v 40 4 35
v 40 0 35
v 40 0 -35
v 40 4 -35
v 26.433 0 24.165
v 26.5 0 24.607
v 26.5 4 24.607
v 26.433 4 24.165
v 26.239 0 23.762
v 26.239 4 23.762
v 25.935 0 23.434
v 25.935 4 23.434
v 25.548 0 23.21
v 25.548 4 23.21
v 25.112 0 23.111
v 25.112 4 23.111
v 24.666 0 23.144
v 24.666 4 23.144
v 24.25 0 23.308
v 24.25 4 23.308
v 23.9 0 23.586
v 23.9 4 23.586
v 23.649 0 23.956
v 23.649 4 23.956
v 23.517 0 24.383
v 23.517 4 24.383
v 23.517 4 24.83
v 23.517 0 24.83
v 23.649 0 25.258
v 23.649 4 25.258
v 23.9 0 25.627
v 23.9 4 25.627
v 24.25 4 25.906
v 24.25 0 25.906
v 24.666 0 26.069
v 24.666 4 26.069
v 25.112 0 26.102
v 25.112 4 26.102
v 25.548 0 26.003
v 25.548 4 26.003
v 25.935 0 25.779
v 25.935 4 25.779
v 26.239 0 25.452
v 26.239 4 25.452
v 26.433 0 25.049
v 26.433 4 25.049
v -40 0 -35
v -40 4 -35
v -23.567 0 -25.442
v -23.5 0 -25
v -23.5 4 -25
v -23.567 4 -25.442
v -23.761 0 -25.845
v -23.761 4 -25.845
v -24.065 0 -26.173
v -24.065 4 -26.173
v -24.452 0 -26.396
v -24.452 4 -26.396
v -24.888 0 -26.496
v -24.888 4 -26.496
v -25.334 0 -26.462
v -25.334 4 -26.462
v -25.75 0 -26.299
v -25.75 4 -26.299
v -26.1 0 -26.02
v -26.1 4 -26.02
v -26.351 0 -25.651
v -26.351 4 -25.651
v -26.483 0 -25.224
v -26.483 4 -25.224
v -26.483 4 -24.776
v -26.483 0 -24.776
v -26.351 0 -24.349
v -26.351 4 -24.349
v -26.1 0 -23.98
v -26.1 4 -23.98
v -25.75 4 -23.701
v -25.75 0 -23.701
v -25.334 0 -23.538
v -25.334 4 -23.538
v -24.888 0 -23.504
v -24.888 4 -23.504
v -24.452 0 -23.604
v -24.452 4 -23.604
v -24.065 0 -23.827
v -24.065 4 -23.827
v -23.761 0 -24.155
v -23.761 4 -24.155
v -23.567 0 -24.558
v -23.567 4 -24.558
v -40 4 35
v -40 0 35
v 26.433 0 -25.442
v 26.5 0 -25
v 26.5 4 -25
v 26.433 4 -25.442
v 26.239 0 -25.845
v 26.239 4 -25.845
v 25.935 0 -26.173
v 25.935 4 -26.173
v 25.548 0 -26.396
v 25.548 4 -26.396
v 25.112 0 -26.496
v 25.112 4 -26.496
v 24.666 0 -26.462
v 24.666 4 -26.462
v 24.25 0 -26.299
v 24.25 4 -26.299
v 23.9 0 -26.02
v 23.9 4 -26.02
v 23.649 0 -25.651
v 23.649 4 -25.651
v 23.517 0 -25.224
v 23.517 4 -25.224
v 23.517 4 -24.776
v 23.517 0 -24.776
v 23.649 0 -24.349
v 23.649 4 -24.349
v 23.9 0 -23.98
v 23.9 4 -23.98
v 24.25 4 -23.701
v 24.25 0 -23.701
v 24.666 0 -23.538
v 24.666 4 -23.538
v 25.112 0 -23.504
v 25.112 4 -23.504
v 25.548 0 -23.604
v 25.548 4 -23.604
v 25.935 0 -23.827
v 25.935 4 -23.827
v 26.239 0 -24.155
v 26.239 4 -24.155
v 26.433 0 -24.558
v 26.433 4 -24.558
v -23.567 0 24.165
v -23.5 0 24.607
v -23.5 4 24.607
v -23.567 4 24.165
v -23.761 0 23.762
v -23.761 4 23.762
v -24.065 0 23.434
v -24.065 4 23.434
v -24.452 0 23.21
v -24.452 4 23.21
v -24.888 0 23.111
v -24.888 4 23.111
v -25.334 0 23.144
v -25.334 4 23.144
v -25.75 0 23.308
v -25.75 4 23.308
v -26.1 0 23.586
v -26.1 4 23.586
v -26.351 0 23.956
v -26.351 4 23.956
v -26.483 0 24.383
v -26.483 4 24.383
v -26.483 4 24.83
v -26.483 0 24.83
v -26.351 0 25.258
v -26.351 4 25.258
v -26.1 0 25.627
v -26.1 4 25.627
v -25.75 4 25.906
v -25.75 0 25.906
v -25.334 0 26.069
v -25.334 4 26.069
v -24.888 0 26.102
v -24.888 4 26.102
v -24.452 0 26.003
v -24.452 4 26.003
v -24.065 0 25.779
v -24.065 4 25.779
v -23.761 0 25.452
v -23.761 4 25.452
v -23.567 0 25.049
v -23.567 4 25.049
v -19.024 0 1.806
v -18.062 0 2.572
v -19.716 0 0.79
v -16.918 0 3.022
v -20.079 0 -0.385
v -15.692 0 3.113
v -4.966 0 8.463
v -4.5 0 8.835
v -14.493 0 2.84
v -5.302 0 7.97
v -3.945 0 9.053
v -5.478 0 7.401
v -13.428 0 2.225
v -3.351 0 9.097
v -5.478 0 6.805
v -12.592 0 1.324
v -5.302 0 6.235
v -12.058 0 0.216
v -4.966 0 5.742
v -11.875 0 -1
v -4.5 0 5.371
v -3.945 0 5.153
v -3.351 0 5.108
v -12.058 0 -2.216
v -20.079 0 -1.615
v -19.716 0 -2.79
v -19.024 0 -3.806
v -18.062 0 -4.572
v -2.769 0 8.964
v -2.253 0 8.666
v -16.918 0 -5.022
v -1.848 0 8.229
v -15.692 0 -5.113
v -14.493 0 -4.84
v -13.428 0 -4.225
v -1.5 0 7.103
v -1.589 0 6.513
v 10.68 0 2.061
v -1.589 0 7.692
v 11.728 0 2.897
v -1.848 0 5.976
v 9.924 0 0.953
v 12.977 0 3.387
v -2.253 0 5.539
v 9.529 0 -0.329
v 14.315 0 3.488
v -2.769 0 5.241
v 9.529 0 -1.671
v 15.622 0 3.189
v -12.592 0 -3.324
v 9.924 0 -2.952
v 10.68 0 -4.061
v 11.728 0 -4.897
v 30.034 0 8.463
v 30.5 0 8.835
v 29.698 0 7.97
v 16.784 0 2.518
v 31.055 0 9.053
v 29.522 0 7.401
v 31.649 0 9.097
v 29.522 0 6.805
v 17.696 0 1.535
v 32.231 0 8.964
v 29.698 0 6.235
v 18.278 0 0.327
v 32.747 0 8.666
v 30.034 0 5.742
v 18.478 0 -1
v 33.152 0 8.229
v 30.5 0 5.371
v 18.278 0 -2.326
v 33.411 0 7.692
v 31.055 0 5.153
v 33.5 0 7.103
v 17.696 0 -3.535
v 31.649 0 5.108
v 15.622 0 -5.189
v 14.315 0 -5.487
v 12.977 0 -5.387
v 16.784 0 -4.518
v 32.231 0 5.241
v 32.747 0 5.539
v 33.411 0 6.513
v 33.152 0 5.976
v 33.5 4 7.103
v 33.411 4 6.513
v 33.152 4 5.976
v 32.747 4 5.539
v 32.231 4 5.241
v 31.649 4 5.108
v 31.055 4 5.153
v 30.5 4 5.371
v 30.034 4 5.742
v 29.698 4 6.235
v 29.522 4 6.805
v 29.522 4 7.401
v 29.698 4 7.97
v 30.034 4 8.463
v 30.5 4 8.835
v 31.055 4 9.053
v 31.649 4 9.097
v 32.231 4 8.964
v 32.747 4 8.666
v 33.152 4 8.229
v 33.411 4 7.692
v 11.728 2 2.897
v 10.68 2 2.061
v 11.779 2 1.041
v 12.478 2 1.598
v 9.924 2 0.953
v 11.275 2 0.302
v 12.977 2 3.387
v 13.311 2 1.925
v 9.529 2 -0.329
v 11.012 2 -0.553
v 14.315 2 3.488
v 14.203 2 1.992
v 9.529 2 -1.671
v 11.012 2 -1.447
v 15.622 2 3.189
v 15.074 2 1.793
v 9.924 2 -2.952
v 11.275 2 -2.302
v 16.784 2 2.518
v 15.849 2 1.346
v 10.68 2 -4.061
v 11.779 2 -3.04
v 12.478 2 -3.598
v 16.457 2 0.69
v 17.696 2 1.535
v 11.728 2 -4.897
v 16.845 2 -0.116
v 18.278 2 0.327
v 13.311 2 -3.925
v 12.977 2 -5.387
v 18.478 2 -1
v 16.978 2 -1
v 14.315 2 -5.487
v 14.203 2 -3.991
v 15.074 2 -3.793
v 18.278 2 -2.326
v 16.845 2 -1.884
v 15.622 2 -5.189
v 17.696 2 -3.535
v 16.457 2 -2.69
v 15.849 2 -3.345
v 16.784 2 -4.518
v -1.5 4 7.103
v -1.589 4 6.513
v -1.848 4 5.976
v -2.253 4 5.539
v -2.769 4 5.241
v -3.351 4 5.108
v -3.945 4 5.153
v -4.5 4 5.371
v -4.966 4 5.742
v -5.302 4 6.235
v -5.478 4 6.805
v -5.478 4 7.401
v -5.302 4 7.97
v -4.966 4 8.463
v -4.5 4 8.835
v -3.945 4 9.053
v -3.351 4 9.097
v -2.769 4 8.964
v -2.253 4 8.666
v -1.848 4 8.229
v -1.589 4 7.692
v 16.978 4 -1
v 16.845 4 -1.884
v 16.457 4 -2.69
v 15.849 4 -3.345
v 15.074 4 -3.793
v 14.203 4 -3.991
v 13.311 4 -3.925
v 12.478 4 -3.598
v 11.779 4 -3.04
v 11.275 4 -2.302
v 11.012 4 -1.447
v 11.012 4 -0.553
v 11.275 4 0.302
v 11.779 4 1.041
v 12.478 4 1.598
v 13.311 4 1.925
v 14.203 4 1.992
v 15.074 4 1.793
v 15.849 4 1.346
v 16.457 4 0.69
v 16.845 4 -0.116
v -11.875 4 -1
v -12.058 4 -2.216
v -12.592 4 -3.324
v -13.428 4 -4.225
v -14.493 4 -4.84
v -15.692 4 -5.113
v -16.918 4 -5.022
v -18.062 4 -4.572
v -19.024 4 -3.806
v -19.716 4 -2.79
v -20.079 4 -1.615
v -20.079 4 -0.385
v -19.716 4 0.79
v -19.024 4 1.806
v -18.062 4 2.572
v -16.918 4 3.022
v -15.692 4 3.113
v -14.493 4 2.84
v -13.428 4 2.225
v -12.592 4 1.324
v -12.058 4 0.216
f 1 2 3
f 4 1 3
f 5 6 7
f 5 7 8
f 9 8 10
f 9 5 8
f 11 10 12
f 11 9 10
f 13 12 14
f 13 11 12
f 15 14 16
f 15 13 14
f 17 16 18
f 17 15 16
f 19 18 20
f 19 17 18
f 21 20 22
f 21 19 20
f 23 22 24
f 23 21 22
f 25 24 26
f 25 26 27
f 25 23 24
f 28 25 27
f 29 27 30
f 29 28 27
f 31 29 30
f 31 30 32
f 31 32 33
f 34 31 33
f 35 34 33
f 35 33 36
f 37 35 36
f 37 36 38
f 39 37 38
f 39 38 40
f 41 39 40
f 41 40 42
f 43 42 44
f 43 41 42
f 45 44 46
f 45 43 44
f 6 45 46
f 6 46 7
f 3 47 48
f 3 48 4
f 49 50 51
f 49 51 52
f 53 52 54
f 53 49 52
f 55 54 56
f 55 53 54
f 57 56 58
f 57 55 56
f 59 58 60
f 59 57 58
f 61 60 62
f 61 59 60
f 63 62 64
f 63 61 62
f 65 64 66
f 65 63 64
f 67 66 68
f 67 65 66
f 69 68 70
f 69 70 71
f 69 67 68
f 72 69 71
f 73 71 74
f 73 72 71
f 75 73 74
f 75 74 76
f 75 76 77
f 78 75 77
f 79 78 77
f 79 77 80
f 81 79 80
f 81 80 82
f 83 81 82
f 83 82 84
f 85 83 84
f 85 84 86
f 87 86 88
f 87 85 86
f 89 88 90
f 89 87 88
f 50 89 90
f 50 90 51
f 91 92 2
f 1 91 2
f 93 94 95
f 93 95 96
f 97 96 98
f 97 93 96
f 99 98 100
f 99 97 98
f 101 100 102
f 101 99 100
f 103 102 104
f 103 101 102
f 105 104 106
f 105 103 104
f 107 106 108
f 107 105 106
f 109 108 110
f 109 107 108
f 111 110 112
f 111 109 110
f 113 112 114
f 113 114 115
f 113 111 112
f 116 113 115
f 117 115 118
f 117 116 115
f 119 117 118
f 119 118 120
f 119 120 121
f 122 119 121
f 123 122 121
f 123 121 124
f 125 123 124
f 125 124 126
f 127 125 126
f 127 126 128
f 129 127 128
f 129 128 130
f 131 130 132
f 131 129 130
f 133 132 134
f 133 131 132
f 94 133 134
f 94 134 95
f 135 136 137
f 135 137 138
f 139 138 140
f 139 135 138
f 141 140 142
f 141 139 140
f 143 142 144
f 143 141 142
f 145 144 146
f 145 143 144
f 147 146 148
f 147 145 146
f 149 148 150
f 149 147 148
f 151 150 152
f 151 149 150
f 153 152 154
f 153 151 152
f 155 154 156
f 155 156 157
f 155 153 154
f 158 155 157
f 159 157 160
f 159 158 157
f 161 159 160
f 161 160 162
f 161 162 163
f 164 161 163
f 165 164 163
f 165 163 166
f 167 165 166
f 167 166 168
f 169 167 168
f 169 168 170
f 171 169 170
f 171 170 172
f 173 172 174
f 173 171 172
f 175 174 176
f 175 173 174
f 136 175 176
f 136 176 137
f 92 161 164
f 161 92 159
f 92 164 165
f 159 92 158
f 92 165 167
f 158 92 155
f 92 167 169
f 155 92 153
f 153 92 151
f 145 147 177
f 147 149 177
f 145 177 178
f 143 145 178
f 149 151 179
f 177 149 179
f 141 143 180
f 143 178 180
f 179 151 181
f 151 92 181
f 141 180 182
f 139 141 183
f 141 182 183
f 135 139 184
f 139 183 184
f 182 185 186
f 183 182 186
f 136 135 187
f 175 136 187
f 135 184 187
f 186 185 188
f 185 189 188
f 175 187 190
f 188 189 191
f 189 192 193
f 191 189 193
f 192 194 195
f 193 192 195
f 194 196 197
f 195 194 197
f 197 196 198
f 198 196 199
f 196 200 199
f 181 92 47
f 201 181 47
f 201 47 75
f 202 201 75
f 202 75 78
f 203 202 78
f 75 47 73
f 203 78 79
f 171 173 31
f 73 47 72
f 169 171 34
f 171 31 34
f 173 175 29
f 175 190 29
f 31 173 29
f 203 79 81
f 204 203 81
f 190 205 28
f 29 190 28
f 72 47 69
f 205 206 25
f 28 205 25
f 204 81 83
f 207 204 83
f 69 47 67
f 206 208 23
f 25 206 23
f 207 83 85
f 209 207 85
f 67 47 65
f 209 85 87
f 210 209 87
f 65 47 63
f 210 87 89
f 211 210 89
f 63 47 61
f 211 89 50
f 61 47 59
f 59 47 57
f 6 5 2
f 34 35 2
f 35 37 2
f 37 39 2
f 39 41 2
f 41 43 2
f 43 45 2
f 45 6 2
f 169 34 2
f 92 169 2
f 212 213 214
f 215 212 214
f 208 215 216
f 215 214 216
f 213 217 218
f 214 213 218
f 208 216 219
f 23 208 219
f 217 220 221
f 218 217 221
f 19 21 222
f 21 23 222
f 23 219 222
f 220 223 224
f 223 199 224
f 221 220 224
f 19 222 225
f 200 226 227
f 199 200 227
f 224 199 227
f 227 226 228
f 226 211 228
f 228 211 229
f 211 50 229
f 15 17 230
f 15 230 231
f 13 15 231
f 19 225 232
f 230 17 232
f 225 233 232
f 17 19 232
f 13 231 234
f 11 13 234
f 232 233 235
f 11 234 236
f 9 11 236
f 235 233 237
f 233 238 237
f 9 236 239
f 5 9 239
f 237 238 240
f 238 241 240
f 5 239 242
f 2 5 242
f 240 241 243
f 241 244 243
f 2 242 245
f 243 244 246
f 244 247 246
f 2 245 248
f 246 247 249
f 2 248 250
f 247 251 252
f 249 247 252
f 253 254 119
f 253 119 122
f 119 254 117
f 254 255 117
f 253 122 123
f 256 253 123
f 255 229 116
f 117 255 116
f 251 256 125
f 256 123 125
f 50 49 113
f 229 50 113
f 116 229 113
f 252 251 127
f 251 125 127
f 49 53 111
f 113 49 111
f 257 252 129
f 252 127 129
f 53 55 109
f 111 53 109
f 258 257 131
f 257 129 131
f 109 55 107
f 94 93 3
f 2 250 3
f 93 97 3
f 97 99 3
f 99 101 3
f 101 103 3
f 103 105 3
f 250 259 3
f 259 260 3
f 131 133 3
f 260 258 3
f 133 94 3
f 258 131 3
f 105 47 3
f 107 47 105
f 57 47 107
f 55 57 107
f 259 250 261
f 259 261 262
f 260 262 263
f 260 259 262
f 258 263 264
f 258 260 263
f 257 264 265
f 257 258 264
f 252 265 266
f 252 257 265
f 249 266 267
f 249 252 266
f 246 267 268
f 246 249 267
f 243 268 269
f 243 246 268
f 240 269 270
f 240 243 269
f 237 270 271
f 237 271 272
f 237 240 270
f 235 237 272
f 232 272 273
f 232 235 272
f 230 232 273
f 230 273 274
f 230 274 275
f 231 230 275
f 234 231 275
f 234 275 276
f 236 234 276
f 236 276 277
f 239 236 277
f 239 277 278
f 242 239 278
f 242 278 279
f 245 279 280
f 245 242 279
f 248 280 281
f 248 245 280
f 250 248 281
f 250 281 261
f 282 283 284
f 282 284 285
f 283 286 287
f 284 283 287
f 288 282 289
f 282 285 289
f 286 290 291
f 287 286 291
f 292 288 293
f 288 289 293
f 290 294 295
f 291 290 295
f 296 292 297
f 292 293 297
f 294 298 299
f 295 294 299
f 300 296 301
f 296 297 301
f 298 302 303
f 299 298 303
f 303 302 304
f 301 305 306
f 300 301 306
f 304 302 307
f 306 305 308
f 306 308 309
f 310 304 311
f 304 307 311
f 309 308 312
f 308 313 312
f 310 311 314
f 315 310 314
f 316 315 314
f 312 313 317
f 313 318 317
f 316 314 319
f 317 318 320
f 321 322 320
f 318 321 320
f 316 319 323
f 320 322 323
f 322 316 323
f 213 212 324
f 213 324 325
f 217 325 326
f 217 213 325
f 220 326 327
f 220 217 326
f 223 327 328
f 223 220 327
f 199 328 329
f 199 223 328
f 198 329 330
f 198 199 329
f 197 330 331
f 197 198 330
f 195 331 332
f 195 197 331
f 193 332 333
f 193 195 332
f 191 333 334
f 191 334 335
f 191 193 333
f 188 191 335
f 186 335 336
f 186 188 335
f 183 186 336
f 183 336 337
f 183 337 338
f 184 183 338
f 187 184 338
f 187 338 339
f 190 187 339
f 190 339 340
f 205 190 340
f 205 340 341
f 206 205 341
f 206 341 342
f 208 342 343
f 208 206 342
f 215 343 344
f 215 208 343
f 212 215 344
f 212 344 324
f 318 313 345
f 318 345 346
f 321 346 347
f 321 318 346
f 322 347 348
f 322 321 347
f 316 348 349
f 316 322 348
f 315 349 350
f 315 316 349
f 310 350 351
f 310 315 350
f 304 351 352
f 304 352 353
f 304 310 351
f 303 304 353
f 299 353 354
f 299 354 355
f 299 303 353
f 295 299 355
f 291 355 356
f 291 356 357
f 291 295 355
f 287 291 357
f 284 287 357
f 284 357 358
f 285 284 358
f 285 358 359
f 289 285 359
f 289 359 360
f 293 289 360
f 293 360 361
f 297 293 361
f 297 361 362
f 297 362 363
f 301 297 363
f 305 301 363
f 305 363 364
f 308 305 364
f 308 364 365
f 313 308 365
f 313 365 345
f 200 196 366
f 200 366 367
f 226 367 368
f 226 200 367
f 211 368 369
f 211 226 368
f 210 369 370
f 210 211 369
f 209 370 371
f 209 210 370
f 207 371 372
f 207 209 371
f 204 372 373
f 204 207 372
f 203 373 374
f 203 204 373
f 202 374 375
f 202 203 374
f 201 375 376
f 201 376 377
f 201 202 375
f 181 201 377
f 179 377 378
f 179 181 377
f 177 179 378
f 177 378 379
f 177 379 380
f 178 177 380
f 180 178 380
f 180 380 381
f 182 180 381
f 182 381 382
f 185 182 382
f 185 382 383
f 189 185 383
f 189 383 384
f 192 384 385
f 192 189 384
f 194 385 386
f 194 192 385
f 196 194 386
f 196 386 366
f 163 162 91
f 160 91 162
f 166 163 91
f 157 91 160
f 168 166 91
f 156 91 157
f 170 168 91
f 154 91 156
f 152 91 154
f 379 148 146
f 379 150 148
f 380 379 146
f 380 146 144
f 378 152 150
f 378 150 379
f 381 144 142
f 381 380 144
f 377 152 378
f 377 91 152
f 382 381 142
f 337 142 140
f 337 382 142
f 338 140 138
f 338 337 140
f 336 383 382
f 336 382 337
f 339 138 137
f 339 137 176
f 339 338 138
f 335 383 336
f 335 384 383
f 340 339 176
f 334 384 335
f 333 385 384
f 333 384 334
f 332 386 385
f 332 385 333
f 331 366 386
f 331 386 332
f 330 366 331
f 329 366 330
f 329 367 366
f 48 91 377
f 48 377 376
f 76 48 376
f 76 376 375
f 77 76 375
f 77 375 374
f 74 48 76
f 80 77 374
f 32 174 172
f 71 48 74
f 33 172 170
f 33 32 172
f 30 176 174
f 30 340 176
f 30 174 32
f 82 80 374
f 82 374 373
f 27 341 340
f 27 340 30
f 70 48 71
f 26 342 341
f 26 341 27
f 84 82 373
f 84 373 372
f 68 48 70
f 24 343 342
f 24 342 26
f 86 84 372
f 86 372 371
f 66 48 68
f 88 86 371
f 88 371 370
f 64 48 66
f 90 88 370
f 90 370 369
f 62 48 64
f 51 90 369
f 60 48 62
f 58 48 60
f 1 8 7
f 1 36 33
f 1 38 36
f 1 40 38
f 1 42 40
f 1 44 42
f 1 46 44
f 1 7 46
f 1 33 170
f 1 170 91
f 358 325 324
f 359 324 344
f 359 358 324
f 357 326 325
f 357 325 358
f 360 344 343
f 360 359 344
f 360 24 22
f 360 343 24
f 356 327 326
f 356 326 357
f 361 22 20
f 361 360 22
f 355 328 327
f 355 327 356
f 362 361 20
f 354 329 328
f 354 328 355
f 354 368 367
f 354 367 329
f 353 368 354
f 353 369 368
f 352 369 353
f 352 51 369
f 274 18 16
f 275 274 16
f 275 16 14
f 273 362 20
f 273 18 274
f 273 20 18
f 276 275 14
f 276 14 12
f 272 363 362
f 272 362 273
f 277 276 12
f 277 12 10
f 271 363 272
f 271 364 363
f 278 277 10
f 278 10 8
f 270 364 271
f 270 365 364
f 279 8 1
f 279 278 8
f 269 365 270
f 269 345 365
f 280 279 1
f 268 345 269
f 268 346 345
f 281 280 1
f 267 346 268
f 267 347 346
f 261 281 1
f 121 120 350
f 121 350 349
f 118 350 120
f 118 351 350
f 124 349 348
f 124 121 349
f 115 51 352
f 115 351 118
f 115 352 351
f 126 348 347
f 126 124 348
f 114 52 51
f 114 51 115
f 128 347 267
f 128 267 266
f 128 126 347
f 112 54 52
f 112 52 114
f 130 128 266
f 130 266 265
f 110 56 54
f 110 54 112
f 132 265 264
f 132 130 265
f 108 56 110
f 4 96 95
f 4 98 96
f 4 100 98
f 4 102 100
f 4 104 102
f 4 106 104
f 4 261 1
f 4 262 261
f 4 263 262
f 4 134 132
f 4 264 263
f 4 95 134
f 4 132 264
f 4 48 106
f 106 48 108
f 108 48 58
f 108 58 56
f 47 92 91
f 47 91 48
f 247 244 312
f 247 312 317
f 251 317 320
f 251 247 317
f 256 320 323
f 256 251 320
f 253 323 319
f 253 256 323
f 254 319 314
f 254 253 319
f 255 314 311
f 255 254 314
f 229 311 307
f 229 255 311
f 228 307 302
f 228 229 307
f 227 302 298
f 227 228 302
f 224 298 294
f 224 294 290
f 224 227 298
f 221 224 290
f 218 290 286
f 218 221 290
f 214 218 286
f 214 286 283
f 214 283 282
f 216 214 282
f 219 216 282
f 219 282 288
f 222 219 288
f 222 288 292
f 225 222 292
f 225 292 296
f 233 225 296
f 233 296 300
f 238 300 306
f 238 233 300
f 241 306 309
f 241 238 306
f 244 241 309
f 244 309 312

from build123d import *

# Parameters (mm, degrees)
SKETCH1_W           = 80
SKETCH1_H           = 70
SKETCH1_R           = 1.5
SKETCH1_R_2         = 2
SKETCH1_R_3         = 4.125
SKETCH1_R_4         = 3
BOSS_EXTRUDE4_DEPTH = 4
SKETCH1_7_R         = 4.5
CUT_EXTRUDE2_DEPTH  = 2


with BuildPart() as part:
    # Sketch1 → Boss-Extrude4 (new body)
    with BuildSketch(Plane(origin=(0, 0, 0), x_dir=(1, 0, 0), z_dir=(0, 1, 0))):
        Rectangle(SKETCH1_W, SKETCH1_H)
        with Locations((-25, 25)):
            Circle(SKETCH1_R, mode=Mode.SUBTRACT)
        with Locations((25, 25)):
            Circle(SKETCH1_R, mode=Mode.SUBTRACT)
        with Locations((25, -24.60667729)):
            Circle(SKETCH1_R, mode=Mode.SUBTRACT)
        with Locations((-25, -24.60667729)):
            Circle(SKETCH1_R, mode=Mode.SUBTRACT)
        with Locations((-3.5, -7.102660735)):
            Circle(SKETCH1_R_2, mode=Mode.SUBTRACT)
        with Locations((31.5, -7.102660735)):
            Circle(SKETCH1_R_2, mode=Mode.SUBTRACT)
        with Locations((-16, 1)):
            Circle(SKETCH1_R_3, mode=Mode.SUBTRACT)
        with Locations((13.978339488, 0.999882702)):
            Circle(SKETCH1_R_4, mode=Mode.SUBTRACT)
    extrude(amount=BOSS_EXTRUDE4_DEPTH)

    # Sketch1<7> → Cut-Extrude2 (cut)
    with BuildSketch(Plane(origin=(0, 0, 0), x_dir=(1, 0, 0), z_dir=(0, 1, 0))):
        with Locations((13.978339488, 0.999882702)):
            Circle(SKETCH1_7_R)
    extrude(amount=CUT_EXTRUDE2_DEPTH, mode=Mode.SUBTRACT)


solid = part.part
